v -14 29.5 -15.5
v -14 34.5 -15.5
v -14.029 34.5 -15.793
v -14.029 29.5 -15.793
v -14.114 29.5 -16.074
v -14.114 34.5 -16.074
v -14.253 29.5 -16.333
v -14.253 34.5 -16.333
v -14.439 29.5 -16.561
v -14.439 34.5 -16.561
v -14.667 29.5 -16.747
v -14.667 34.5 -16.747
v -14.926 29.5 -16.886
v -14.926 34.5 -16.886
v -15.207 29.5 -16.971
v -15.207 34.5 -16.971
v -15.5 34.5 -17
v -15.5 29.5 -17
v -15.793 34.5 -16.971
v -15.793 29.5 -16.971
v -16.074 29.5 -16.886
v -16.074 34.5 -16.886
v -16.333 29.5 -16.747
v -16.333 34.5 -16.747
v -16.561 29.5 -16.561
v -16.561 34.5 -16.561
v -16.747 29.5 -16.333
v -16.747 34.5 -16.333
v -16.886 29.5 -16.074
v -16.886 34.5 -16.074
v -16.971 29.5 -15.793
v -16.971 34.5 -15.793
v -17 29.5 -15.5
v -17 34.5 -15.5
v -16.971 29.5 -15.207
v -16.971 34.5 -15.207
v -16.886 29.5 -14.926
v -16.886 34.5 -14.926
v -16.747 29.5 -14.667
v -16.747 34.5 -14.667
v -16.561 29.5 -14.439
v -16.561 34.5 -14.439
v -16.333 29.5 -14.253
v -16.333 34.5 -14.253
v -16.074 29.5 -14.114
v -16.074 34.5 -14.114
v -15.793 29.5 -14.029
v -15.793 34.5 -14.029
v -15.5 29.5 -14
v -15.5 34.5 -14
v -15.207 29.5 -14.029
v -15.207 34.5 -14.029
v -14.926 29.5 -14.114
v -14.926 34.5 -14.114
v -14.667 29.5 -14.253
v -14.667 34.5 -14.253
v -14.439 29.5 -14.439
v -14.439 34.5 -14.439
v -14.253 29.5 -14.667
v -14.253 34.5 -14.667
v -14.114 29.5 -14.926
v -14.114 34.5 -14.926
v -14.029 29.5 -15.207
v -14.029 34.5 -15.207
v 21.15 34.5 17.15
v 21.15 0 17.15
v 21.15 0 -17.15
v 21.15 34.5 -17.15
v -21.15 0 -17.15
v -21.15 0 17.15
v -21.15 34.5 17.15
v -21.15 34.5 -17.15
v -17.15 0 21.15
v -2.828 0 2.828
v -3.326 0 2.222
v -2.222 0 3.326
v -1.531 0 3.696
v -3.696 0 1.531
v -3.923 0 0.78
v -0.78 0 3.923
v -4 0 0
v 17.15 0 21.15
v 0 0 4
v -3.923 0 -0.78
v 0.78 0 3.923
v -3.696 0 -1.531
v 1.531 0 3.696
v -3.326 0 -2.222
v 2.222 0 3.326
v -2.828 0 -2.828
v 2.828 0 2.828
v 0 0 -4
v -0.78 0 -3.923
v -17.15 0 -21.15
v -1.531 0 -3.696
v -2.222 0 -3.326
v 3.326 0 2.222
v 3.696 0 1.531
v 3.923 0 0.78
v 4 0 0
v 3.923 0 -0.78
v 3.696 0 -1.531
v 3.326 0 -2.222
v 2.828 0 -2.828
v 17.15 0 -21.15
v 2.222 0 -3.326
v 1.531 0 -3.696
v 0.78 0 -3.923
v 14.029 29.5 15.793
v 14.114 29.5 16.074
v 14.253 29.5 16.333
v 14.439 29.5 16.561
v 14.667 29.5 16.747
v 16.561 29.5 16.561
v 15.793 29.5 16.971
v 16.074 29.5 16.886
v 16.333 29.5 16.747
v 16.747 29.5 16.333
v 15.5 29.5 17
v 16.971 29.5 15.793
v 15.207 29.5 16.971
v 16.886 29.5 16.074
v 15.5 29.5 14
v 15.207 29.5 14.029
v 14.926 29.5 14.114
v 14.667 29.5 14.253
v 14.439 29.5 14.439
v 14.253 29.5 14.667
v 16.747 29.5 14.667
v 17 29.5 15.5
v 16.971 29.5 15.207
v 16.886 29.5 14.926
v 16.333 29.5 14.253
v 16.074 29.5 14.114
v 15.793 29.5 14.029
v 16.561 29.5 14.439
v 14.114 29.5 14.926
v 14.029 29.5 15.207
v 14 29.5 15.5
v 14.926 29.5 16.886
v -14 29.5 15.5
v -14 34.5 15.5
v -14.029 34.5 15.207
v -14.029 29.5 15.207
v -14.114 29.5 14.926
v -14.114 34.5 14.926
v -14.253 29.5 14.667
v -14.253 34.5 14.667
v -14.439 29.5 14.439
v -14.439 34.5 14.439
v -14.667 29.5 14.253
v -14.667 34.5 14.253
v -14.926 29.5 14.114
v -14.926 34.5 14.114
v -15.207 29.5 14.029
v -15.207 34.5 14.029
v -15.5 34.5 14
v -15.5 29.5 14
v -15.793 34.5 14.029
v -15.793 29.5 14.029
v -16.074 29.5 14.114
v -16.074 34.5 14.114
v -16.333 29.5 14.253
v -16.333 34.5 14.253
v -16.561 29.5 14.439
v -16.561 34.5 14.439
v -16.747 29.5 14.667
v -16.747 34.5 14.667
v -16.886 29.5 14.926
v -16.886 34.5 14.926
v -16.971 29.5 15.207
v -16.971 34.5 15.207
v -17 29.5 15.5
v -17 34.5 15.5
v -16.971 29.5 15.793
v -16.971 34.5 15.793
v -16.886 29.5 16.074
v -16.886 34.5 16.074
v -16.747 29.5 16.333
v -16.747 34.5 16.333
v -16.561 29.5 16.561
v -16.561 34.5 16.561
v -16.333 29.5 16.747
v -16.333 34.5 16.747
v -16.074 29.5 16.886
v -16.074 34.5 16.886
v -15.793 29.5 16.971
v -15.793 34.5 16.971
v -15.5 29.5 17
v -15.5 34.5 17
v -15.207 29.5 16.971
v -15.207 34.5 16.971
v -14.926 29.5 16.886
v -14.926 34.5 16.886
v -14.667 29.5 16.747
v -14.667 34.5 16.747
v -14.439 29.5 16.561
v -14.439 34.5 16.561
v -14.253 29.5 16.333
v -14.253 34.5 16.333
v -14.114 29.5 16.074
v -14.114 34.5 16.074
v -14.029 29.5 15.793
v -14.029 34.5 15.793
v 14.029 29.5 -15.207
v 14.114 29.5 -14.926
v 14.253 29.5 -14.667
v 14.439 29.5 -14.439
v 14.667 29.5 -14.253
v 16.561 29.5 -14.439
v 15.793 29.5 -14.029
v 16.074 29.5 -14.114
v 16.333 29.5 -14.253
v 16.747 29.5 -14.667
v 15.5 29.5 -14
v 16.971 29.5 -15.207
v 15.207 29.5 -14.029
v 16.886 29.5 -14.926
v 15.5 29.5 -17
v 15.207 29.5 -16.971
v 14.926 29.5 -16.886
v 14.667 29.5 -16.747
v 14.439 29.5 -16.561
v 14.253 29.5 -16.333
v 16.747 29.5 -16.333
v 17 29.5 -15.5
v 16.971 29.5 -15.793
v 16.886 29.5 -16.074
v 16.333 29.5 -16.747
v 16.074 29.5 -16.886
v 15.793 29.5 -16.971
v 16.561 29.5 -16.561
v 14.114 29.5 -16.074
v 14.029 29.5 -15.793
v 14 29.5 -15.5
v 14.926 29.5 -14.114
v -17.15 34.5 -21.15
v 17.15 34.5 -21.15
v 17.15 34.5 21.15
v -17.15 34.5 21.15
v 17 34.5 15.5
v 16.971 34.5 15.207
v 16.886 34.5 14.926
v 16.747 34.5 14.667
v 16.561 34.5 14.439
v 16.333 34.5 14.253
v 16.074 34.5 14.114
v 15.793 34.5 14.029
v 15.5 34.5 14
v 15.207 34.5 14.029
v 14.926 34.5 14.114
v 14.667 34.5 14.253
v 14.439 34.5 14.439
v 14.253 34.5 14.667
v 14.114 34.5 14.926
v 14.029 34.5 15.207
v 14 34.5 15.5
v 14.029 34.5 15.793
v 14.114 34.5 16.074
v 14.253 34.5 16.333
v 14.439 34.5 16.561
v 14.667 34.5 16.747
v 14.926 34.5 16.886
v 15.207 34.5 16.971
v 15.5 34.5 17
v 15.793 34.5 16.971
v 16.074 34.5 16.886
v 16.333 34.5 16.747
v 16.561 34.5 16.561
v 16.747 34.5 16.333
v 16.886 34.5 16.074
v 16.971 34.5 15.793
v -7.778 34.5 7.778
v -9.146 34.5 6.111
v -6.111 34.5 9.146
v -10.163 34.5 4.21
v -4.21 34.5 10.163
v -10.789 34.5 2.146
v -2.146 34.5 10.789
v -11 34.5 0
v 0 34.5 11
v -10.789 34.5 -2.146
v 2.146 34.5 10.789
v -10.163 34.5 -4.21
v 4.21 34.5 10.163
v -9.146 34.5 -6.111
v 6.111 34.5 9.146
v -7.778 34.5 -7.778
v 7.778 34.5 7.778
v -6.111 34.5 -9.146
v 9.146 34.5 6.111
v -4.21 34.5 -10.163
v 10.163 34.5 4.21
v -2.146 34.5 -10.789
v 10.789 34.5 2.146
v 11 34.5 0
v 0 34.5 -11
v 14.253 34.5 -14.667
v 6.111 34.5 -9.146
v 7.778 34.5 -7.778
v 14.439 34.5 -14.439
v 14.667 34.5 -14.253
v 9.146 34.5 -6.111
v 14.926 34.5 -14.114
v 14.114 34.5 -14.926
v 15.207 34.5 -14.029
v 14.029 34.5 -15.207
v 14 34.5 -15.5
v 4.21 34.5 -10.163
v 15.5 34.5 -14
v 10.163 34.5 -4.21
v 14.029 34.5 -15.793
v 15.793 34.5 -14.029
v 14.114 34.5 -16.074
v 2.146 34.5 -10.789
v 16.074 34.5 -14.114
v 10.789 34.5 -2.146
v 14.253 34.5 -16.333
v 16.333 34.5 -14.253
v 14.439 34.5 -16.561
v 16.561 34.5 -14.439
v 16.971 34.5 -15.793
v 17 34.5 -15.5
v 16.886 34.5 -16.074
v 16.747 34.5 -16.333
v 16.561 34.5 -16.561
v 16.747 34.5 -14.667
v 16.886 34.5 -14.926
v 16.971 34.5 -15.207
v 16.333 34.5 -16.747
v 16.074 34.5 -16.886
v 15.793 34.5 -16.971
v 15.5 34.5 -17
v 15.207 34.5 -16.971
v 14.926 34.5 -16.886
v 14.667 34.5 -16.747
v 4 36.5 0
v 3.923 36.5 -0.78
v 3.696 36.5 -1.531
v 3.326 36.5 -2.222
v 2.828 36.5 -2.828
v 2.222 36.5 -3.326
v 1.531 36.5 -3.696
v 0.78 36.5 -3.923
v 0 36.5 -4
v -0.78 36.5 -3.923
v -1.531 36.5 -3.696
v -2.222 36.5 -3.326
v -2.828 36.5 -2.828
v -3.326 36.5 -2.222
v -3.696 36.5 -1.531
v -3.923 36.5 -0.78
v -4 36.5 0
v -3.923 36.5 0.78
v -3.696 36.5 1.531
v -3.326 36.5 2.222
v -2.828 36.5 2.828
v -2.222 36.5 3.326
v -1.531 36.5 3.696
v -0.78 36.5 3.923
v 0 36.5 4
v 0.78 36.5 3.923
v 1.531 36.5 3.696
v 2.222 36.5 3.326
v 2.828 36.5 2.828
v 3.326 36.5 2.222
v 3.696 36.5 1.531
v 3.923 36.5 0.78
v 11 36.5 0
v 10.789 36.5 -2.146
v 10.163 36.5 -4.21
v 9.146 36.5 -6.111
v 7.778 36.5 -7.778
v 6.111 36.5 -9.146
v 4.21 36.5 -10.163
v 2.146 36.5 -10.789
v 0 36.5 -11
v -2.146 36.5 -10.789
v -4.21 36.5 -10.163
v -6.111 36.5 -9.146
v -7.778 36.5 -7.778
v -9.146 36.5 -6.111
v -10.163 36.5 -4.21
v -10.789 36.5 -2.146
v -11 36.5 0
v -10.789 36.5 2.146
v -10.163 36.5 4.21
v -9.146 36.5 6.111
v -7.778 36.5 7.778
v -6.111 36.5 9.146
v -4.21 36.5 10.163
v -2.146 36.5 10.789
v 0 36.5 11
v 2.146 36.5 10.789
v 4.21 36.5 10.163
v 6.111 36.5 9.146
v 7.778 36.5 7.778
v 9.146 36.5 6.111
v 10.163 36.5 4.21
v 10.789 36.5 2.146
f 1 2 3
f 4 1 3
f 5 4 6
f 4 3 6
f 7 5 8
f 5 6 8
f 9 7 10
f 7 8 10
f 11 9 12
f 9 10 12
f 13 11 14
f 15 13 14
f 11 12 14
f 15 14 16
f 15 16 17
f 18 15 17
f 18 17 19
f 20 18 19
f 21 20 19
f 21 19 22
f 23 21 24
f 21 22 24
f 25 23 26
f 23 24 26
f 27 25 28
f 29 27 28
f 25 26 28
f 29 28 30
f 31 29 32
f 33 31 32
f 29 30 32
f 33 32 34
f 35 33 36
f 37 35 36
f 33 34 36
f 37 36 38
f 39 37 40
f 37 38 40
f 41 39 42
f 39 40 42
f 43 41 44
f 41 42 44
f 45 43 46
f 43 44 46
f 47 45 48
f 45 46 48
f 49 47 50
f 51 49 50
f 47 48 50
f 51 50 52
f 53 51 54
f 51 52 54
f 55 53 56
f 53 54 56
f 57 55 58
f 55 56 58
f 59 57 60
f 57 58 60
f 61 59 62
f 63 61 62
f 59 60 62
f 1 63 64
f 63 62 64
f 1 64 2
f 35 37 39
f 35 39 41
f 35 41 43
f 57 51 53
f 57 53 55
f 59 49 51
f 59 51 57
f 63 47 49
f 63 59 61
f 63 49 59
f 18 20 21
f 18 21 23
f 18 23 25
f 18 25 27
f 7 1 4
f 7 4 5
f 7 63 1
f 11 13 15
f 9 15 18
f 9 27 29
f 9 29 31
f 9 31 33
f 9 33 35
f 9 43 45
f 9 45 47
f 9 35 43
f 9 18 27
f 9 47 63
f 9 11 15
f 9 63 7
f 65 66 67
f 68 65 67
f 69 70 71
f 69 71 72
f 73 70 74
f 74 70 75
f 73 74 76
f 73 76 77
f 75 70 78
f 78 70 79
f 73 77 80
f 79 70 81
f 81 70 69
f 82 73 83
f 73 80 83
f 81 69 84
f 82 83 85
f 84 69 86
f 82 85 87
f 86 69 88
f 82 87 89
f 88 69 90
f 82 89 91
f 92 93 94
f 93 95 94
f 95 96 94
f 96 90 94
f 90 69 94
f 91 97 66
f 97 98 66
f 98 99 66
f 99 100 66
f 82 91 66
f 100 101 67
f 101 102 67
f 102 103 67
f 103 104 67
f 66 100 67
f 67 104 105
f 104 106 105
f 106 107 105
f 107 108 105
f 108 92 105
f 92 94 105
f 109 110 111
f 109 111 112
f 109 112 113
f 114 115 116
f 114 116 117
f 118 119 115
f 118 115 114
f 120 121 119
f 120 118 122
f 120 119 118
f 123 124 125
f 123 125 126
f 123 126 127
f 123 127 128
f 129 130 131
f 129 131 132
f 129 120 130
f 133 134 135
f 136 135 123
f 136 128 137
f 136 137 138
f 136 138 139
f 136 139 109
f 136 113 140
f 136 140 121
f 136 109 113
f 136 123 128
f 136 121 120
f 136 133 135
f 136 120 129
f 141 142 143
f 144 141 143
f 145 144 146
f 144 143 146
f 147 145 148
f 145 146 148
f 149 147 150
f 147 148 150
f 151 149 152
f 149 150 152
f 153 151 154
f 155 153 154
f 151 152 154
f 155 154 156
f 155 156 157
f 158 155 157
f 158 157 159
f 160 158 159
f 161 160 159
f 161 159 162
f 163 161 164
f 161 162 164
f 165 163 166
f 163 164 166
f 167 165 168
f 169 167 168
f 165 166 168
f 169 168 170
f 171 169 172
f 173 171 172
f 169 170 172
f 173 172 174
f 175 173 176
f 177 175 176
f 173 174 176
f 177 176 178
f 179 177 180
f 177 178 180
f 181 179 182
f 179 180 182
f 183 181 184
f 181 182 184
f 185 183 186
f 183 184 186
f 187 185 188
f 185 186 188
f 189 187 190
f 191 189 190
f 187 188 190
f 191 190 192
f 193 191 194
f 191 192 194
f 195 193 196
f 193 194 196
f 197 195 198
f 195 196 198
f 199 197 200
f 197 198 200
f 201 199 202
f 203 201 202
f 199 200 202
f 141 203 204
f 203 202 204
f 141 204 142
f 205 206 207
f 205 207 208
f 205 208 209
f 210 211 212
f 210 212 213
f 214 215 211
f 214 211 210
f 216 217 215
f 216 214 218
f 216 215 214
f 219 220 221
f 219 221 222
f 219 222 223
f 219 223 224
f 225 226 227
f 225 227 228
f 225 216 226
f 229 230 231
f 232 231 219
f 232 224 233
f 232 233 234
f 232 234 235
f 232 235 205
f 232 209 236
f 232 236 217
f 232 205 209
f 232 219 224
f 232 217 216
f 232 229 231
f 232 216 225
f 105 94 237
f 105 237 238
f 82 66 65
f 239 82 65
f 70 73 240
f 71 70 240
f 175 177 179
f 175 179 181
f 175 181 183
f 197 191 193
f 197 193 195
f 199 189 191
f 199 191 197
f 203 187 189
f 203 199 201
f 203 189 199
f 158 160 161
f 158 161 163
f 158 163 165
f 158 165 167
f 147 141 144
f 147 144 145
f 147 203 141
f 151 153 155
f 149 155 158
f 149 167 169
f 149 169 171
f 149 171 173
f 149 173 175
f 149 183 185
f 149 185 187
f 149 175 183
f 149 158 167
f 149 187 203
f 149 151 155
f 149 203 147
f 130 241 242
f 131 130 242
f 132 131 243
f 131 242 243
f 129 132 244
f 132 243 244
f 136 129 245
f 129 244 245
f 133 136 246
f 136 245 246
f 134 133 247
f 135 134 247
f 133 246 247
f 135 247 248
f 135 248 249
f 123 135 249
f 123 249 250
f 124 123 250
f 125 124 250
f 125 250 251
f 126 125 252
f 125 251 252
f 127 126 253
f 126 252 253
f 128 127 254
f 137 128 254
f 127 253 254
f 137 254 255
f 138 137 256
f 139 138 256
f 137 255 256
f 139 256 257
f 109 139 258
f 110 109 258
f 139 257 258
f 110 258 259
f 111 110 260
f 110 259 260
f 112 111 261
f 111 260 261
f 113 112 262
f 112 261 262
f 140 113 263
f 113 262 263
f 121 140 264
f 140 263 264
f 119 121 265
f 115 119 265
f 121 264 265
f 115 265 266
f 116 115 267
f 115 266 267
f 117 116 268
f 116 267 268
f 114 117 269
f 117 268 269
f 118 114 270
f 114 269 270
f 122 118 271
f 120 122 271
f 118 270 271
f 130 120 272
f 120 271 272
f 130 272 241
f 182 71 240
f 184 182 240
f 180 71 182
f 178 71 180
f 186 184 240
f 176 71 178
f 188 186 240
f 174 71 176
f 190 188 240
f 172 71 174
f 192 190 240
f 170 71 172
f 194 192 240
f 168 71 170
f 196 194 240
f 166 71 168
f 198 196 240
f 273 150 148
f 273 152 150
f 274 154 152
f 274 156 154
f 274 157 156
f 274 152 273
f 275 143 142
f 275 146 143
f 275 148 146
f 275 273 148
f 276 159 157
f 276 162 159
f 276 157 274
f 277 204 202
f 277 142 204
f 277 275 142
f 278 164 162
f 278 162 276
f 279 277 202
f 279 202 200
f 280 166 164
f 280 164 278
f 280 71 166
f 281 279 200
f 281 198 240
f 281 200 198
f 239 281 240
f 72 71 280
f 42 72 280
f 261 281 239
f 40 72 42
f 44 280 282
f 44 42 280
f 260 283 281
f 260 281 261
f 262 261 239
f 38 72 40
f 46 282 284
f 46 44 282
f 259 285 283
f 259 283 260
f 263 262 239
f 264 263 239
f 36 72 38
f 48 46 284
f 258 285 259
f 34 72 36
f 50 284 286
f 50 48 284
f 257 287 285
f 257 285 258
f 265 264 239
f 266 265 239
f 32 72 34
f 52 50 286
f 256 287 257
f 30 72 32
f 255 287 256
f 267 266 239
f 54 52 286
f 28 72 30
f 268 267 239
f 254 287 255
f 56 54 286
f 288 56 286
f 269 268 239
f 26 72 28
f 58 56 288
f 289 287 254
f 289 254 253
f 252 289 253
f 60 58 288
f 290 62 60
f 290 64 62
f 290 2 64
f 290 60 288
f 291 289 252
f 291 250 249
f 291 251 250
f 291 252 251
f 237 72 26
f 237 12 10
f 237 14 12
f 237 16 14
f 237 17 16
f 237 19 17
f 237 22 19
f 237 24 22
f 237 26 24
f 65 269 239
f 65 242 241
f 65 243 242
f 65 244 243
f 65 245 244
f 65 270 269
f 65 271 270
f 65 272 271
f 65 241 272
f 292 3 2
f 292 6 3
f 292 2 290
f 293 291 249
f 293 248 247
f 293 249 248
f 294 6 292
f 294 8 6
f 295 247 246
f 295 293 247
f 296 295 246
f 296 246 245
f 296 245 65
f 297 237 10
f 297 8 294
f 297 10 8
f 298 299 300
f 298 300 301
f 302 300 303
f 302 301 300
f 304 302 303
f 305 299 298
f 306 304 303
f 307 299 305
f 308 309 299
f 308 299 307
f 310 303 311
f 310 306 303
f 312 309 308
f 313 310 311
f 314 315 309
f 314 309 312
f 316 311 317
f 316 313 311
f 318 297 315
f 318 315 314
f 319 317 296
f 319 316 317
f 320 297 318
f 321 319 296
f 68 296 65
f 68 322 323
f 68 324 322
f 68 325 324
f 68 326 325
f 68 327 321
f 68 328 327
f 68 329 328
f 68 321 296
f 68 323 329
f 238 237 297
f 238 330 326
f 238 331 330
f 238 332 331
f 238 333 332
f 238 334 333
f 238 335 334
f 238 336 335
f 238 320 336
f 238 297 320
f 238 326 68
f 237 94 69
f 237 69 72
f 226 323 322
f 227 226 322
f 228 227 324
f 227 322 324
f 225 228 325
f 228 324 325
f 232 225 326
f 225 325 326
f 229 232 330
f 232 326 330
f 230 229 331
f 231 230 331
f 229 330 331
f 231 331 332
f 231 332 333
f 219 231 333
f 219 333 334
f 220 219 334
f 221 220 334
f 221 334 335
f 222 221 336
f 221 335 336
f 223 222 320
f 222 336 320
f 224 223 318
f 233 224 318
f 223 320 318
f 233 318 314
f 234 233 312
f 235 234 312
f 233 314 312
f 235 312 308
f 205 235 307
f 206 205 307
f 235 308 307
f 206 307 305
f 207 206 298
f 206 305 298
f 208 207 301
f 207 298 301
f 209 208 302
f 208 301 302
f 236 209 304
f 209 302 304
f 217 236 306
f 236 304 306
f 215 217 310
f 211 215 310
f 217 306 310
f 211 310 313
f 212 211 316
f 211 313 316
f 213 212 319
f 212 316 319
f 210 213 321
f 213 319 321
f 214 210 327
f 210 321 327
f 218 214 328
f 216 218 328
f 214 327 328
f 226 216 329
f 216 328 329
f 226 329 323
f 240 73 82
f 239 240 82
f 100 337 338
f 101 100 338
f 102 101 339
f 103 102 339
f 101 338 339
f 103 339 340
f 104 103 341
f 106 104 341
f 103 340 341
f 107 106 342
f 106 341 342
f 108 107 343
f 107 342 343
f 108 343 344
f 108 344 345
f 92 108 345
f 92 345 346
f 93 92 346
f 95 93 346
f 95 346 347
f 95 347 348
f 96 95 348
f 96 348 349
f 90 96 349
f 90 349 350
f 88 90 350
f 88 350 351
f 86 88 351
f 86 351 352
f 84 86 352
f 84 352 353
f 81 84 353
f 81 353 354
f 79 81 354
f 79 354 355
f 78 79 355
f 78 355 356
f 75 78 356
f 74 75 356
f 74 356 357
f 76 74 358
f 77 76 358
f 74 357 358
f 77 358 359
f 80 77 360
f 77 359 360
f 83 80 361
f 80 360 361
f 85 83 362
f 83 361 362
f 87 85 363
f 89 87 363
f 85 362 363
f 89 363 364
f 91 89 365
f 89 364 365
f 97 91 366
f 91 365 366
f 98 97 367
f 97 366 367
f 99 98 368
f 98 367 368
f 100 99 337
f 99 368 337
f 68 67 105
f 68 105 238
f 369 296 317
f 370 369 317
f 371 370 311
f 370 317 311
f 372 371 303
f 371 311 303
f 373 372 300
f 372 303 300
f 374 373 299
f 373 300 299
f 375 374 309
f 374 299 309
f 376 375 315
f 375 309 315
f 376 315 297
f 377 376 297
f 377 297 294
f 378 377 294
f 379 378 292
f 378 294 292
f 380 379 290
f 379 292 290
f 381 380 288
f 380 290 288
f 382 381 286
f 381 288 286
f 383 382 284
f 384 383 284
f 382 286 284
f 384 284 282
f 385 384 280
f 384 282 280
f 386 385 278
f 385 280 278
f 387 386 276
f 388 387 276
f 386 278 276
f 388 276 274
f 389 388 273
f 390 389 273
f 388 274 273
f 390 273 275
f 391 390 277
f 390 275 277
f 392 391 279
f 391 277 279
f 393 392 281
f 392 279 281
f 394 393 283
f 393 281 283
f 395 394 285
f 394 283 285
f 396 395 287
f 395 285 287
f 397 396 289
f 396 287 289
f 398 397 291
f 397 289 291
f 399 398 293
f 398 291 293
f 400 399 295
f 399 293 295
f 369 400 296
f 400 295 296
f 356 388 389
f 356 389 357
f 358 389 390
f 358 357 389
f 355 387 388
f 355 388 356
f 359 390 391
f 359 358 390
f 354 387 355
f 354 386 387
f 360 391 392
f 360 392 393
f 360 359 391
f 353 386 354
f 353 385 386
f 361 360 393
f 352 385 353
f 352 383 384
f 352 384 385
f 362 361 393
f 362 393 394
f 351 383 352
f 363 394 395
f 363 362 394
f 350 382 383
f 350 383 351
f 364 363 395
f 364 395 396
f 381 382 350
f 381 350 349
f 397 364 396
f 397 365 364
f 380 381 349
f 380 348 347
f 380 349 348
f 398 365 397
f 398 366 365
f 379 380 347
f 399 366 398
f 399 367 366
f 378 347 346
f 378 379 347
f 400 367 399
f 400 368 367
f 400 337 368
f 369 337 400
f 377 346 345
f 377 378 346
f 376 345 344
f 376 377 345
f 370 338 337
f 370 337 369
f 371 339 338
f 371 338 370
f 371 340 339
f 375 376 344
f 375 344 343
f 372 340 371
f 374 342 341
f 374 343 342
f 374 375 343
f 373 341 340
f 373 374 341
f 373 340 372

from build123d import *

# Parameters (mm, degrees)
SKETCH_1_W          = 42.3
SKETCH_1_H          = 42.3
EXTRUDE_1_DEPTH     = 34.5
SKETCH_2_R          = 11
EXTRUDE_2_DEPTH     = 2
SKETCH_3_R          = 1.5
CUT_EXTRUDE_1_DEPTH = 5
SKETCH_4_R          = 4
CUT_EXTRUDE_2_DEPTH = 37.5
CHAMFER_1_SIZE      = 4


with BuildPart() as part:
    # 草图1 → 凸台-拉伸1 (new body)
    with BuildSketch(Plane(origin=(0, 0, 0), x_dir=(1, 0, 0), z_dir=(0, 1, 0))):
        Rectangle(SKETCH_1_W, SKETCH_1_H)
    extrude(amount=EXTRUDE_1_DEPTH)

    # 草图2 → 凸台-拉伸2 (add)
    with BuildSketch(Plane(origin=(0, 34.5, 0), x_dir=(1, 0, 0), z_dir=(0, 1, 0))):
        Circle(SKETCH_2_R)
    extrude(amount=EXTRUDE_2_DEPTH)

    # 草图3 → 切除-拉伸1 (cut)
    with BuildSketch(Plane(origin=(0, 34.5, 0), x_dir=(1, 0, 0), z_dir=(0, 1, 0))):
        with Locations((-15.5, 15.5)):
            Circle(SKETCH_3_R)
        with Locations((15.5, 15.5)):
            Circle(SKETCH_3_R)
        with Locations((15.5, -15.5)):
            Circle(SKETCH_3_R)
        with Locations((-15.5, -15.5)):
            Circle(SKETCH_3_R)
    extrude(amount=-CUT_EXTRUDE_1_DEPTH, mode=Mode.SUBTRACT)

    # 草图4 → 切除-拉伸2 (cut, through all)
    with BuildSketch(Plane(origin=(0, 36.5, 0), x_dir=(1, 0, 0), z_dir=(0, 1, 0))):
        Circle(SKETCH_4_R)
    extrude(amount=-CUT_EXTRUDE_2_DEPTH, mode=Mode.SUBTRACT)

    # 倒角1
    chamfer_1_edges = [part.edges().sort_by_distance(p)[0] for p in [
        (21.15, 17.25, 21.15),
        (-21.15, 17.25, 21.15),
        (-21.15, 17.25, -21.15),
        (21.15, 17.25, -21.15),
    ]]
    chamfer(chamfer_1_edges, length=CHAMFER_1_SIZE)


solid = part.part
